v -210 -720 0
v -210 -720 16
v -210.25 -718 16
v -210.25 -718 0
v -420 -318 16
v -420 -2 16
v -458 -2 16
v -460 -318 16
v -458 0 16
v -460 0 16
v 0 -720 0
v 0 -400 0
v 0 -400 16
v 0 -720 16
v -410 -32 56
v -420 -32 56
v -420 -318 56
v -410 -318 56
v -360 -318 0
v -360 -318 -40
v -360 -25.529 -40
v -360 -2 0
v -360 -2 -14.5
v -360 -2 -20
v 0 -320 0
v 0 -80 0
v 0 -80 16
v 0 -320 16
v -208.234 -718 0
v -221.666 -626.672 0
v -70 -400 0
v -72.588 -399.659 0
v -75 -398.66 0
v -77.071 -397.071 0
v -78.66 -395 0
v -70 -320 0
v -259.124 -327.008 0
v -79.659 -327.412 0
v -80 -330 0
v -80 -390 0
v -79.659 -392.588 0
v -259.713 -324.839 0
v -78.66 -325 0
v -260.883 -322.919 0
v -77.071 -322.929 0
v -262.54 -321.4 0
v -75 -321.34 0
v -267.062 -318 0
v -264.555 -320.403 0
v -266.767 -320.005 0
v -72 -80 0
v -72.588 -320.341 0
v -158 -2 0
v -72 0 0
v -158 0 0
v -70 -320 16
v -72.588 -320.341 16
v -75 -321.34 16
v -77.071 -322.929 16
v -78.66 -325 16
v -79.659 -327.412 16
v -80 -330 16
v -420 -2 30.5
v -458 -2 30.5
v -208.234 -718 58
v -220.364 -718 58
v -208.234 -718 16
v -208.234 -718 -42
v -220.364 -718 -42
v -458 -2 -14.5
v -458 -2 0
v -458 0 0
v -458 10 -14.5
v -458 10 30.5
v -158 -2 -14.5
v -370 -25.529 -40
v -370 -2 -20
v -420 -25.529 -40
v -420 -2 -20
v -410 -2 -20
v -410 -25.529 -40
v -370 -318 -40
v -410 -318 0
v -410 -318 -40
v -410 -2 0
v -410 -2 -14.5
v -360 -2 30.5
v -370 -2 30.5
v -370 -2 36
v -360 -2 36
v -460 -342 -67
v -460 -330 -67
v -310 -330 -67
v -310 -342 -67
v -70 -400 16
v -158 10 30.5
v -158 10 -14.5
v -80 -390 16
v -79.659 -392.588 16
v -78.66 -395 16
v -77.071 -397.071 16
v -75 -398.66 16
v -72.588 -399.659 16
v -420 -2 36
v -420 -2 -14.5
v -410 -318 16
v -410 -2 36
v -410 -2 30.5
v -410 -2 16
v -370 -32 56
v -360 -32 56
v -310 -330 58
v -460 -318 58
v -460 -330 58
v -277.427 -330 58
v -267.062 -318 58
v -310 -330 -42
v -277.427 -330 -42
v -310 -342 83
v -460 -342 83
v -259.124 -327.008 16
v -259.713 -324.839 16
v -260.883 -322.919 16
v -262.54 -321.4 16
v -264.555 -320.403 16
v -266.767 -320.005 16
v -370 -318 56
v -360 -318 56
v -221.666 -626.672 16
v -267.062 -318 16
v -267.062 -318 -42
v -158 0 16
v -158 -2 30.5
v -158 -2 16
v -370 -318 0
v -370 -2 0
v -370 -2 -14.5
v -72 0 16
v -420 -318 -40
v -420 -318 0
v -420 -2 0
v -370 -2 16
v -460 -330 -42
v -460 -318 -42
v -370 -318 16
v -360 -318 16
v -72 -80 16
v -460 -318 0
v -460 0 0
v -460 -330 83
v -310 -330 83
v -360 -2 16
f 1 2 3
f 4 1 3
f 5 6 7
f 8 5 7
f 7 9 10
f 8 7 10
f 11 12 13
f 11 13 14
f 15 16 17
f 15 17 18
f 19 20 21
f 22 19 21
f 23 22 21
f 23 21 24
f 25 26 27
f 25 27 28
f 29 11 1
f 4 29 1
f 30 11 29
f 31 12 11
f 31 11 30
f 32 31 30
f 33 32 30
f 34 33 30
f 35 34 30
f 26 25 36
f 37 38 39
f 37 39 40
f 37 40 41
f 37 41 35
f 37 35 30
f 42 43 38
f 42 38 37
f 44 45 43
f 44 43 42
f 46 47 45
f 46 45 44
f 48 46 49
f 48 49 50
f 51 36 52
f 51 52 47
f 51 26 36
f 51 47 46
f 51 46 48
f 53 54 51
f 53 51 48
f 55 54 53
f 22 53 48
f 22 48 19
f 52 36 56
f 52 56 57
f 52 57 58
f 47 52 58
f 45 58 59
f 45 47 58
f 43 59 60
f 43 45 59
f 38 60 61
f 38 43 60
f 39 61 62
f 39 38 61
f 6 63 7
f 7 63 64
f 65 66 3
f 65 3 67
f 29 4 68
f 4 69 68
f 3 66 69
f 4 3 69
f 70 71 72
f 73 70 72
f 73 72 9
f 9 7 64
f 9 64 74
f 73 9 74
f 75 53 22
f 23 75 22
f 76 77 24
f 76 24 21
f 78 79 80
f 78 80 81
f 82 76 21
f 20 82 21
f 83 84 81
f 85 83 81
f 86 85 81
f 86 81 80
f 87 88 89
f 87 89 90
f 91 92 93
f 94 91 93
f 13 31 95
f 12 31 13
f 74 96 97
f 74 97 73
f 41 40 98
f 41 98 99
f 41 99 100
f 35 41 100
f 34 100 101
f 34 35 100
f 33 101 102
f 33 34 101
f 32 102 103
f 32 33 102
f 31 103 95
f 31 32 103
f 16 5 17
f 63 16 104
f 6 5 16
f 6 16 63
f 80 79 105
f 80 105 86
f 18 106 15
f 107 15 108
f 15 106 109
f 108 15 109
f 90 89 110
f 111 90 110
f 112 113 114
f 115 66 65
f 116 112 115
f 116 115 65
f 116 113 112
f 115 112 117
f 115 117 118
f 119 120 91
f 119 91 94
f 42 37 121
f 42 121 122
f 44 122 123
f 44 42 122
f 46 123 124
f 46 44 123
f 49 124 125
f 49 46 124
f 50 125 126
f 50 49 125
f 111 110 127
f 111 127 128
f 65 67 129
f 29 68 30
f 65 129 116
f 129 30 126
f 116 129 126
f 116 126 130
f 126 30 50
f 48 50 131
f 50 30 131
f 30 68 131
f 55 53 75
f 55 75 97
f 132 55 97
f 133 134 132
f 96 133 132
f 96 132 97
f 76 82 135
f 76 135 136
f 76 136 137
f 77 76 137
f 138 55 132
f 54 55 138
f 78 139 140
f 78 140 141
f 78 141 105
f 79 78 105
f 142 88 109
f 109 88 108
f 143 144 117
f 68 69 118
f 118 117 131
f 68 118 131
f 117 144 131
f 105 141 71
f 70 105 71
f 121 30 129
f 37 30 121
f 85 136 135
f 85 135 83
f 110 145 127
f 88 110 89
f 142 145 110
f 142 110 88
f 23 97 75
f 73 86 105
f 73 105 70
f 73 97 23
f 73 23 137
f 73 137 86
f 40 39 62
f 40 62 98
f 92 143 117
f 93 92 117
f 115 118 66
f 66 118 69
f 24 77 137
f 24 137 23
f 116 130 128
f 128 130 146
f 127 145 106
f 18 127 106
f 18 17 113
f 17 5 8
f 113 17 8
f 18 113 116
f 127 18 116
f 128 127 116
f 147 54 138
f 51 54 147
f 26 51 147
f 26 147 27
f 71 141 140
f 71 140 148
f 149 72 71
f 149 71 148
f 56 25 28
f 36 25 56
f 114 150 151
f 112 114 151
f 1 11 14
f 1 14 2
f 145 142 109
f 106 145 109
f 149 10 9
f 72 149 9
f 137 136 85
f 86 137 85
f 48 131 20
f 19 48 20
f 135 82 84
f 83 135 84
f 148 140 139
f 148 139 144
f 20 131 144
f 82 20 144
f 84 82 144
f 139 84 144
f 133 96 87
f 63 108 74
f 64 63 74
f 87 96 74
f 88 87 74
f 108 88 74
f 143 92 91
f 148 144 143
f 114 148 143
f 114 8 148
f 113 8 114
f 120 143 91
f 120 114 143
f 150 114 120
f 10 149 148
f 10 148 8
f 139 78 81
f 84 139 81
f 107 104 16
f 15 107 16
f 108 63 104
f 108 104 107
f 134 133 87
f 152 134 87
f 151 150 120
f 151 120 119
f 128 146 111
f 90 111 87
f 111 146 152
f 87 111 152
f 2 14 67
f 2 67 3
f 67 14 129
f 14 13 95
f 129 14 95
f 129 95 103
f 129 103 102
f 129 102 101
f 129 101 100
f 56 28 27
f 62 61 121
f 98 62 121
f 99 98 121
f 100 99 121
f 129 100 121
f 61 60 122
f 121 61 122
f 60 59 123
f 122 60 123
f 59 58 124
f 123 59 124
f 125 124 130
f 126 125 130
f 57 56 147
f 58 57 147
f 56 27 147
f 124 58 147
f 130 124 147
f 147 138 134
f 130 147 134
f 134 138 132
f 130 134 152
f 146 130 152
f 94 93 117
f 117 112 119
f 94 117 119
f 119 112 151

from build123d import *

# Parameters (mm, degrees)
EXTRUDE_1242_DEPTH   = 16
EXTRUDE_2_DEPTH      = 40
EXTRUDE_2_DEPTH_BACK = 56
SKETCH_3_W           = 10
SKETCH_3_H           = 316
CUT_EXTRUDE_1_DEPTH  = 836.425640018
CUT_EXTRUDE_2_DEPTH  = 836.425640018
EXTRUDE_5_DEPTH      = 42
EXTRUDE_5_DEPTH_BACK = 58
EXTRUDE_6_DEPTH      = 14.5
EXTRUDE_6_DEPTH_BACK = 30.5
SKETCH_7_W           = 300
SKETCH_7_H           = 12
SKETCH_8_W           = 150
SKETCH_8_H           = 150
EXTRUDE_7_DEPTH      = 12


with BuildPart() as part:
    # 草图1 → Extrude 1242 (new body)
    with BuildSketch(Plane.XY):
        with BuildLine():
            Line((0, -320), (-70, -320))
            ThreePointArc((-70, -320), (-77.071067812, -322.928932188), (-80, -330))
            Line((-80, -330), (-80, -390))
            ThreePointArc((-80, -390), (-77.071067812, -397.071067812), (-70, -400))
            Line((-70, -400), (0, -400))
            Line((0, -400), (0, -720))
            Line((0, -720), (-210, -720))
            Line((-210, -720), (-259.124034735, -327.007722123))
            ThreePointArc((-259.124034735, -327.007722123), (-261.767837242, -322.002574593), (-267.062257748, -320))
            Line((-267.062257748, -320), (-460, -320))
            Line((-460, -320), (-460, 0))
            Line((-460, 0), (-72, 0))
            Line((-72, 0), (-72, -80))
            Line((-72, -80), (0, -80))
            Line((0, -80), (0, -320))
        make_face()
    extrude(amount=EXTRUDE_1242_DEPTH)

    # 草图3 → 凸台-拉伸2 (add, two sides: drawn at the far end of the back side and taken through both)
    with BuildSketch(Plane.XY.offset(16).offset(-EXTRUDE_2_DEPTH_BACK)):
        with Locations((-415, -160)):
            Rectangle(SKETCH_3_W, SKETCH_3_H)
        with Locations((-365, -160)):
            Rectangle(SKETCH_3_W, SKETCH_3_H)
    extrude(amount=EXTRUDE_2_DEPTH + EXTRUDE_2_DEPTH_BACK)

    # 草图4 → 切除-拉伸1 (cut, through all)
    with BuildSketch(Plane.ZY.offset(420)):
        Polygon((-20, -2), (-45.5, -32), (-45.5, -2), align=None)
    extrude(amount=-CUT_EXTRUDE_1_DEPTH, mode=Mode.SUBTRACT)

    # 草图5 → 切除-拉伸2 (cut, through all)
    with BuildSketch(Plane.ZY.offset(420)):
        Polygon((36, -2), (56, -32), (56, -2), align=None)
    extrude(amount=-CUT_EXTRUDE_2_DEPTH, mode=Mode.SUBTRACT)

    # 草图6 → 凸台-拉伸5 (add, two sides: drawn at the far end of the back side and taken through both)
    with BuildSketch(Plane.XY.offset(16).offset(-EXTRUDE_5_DEPTH_BACK)):
        Polygon((-267.062257748, -318), (-460, -318), (-460, -330), (-277.426505546, -330), (-220.363518026, -718), (-208.234435563, -718), align=None)
    extrude(amount=EXTRUDE_5_DEPTH + EXTRUDE_5_DEPTH_BACK)

    # 草图7 → 凸台-拉伸6 (add, two sides: drawn at the far end of the back side and taken through both)
    with BuildSketch(Plane(origin=(0, 0, 0), x_dir=(-1, 0, 0), z_dir=(0, 0, -1)).offset(-EXTRUDE_6_DEPTH_BACK)):
        with Locations((308, 4)):
            Rectangle(SKETCH_7_W, SKETCH_7_H)
    extrude(amount=EXTRUDE_6_DEPTH + EXTRUDE_6_DEPTH_BACK)

    # 草图8 → 凸台-拉伸7 (add)
    with BuildSketch(Plane.XZ.offset(330)):
        with Locations((-385, 8)):
            Rectangle(SKETCH_8_W, SKETCH_8_H)
    extrude(amount=EXTRUDE_7_DEPTH)


solid = part.part
